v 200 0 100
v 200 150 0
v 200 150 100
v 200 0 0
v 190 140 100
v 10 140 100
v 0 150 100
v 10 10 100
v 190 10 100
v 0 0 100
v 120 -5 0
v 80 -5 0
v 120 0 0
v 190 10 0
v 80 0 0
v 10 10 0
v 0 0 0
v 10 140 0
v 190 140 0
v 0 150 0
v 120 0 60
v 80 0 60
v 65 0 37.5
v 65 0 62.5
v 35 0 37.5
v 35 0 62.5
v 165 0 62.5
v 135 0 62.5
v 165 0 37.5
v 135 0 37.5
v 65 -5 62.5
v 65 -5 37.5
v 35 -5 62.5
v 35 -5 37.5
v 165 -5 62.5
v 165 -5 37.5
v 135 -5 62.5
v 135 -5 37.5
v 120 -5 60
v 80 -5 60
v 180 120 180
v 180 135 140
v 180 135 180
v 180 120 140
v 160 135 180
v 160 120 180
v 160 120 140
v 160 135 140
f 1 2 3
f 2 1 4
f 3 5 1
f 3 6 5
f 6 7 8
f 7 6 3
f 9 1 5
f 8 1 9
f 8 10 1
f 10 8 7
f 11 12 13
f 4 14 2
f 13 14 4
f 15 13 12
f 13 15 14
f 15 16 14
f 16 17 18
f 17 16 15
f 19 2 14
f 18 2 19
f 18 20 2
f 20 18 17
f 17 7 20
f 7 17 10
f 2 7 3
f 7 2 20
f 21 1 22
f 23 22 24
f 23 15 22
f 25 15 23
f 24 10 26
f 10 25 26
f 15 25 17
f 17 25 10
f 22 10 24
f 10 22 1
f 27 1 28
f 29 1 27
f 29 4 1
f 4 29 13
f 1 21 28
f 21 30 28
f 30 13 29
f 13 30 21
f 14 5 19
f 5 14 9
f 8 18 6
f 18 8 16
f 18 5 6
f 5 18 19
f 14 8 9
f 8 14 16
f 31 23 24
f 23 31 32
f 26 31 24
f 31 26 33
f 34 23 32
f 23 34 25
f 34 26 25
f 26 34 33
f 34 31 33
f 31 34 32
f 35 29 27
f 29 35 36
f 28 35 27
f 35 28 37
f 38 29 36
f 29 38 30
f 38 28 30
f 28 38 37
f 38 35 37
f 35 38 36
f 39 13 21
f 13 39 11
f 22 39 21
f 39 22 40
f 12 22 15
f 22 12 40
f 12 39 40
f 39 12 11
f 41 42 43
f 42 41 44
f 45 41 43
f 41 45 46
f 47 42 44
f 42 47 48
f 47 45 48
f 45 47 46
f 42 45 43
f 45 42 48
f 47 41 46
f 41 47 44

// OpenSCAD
// VibeCAD House Design
// A simple house with cube base and triangular roof
// HackHarvard 2025

// ===== CONFIGURABLE PARAMETERS =====
// House dimensions (in mm)
house_width = 200;           // Width of the house
house_depth = 150;           // Depth of the house
house_height = 100;          // Height of the walls

// Roof parameters
roof_height = 80;            // Height of the triangular roof
roof_overhang = 20;          // Overhang of roof beyond walls

// Door parameters
door_width = 40;             // Width of the door
door_height = 60;            // Height of the door
door_thickness = 5;          // Thickness of the door

// Window parameters
window_width = 30;           // Width of windows
window_height = 25;          // Height of windows
window_thickness = 5;        // Thickness of window frames

// Wall thickness
wall_thickness = 10;         // Thickness of walls

// ===== MODULES =====

// House base (cube with hollow interior)
module house_base() {
    difference() {
        // Outer walls
        cube([house_width, house_depth, house_height], center = false);
        
        // Hollow interior
        translate([wall_thickness, wall_thickness, 0]) {
            cube([house_width - 2*wall_thickness, house_depth - 2*wall_thickness, house_height], center = false);
        }
    }
}

// Triangular roof
module triangular_roof() {
    // Calculate roof dimensions
    roof_width = house_width + 2*roof_overhang;
    roof_depth = house_depth + 2*roof_overhang;
    
    // Create triangular roof using polyhedron
    translate([-roof_overhang, -roof_overhang, house_height]) {
        polyhedron(
            points = [
                // Base points
                [0, 0, 0],
                [roof_width, 0, 0],
                [roof_width, roof_depth, 0],
                [0, roof_depth, 0],
                // Peak point
                [roof_width/2, roof_depth/2, roof_height]
            ],
            faces = [
                // Base
                [0, 1, 2, 3],
                // Front face
                [0, 1, 4],
                // Right face
                [1, 2, 4],
                // Back face
                [2, 3, 4],
                // Left face
                [3, 0, 4]
            ]
        );
    }
}

// Door
module door() {
    translate([house_width/2 - door_width/2, -wall_thickness/2, 0]) {
        cube([door_width, door_thickness, door_height], center = false);
    }
}

// Windows
module windows() {
    // Front window
    translate([house_width/4 - window_width/2, -wall_thickness/2, house_height/2 - window_height/2]) {
        cube([window_width, window_thickness, window_height], center = false);
    }
    
    // Back window
    translate([3*house_width/4 - window_width/2, -wall_thickness/2, house_height/2 - window_height/2]) {
        cube([window_width, window_thickness, window_height], center = false);
    }
    
    // Side window
    translate([house_width - wall_thickness/2, house_depth/2 - window_width/2, house_height/2 - window_height/2]) {
        cube([window_thickness, window_width, window_height], center = false);
    }
}

// Chimney
module chimney() {
    chimney_width = 20;
    chimney_depth = 15;
    chimney_height = 40;
    
    translate([house_width - 40, house_depth - 30, house_height + roof_height - chimney_height]) {
        cube([chimney_width, chimney_depth, chimney_height], center = false);
    }
}

// ===== MAIN ASSEMBLY =====
module house() {
    // Core components
    house_base();
    triangular_roof();
    door();
    windows();
    chimney();
}

// ===== RENDERING =====
// Uncomment the component you want to render

// Full house
house();

// Individual components for testing (uncomment as needed)
// house_base();
// triangular_roof();
// door();
// windows();
// chimney();

// ===== EXPORT SETTINGS =====
// For high-quality STL export, use these settings in OpenSCAD:
// - File > Export > Export as STL
// - Set resolution to 0.1 or lower for smooth curves
// - Enable "Open File" to view the exported STL

// ===== CUSTOMIZATION NOTES =====
// To customize the house:
// 1. Adjust the parameters at the top of the file
// 2. Modify house dimensions for different sizes
// 3. Change roof_height for different roof styles
// 4. Adjust door and window sizes and positions
// 5. Add more windows or doors as needed
// 6. Modify chimney position and size
